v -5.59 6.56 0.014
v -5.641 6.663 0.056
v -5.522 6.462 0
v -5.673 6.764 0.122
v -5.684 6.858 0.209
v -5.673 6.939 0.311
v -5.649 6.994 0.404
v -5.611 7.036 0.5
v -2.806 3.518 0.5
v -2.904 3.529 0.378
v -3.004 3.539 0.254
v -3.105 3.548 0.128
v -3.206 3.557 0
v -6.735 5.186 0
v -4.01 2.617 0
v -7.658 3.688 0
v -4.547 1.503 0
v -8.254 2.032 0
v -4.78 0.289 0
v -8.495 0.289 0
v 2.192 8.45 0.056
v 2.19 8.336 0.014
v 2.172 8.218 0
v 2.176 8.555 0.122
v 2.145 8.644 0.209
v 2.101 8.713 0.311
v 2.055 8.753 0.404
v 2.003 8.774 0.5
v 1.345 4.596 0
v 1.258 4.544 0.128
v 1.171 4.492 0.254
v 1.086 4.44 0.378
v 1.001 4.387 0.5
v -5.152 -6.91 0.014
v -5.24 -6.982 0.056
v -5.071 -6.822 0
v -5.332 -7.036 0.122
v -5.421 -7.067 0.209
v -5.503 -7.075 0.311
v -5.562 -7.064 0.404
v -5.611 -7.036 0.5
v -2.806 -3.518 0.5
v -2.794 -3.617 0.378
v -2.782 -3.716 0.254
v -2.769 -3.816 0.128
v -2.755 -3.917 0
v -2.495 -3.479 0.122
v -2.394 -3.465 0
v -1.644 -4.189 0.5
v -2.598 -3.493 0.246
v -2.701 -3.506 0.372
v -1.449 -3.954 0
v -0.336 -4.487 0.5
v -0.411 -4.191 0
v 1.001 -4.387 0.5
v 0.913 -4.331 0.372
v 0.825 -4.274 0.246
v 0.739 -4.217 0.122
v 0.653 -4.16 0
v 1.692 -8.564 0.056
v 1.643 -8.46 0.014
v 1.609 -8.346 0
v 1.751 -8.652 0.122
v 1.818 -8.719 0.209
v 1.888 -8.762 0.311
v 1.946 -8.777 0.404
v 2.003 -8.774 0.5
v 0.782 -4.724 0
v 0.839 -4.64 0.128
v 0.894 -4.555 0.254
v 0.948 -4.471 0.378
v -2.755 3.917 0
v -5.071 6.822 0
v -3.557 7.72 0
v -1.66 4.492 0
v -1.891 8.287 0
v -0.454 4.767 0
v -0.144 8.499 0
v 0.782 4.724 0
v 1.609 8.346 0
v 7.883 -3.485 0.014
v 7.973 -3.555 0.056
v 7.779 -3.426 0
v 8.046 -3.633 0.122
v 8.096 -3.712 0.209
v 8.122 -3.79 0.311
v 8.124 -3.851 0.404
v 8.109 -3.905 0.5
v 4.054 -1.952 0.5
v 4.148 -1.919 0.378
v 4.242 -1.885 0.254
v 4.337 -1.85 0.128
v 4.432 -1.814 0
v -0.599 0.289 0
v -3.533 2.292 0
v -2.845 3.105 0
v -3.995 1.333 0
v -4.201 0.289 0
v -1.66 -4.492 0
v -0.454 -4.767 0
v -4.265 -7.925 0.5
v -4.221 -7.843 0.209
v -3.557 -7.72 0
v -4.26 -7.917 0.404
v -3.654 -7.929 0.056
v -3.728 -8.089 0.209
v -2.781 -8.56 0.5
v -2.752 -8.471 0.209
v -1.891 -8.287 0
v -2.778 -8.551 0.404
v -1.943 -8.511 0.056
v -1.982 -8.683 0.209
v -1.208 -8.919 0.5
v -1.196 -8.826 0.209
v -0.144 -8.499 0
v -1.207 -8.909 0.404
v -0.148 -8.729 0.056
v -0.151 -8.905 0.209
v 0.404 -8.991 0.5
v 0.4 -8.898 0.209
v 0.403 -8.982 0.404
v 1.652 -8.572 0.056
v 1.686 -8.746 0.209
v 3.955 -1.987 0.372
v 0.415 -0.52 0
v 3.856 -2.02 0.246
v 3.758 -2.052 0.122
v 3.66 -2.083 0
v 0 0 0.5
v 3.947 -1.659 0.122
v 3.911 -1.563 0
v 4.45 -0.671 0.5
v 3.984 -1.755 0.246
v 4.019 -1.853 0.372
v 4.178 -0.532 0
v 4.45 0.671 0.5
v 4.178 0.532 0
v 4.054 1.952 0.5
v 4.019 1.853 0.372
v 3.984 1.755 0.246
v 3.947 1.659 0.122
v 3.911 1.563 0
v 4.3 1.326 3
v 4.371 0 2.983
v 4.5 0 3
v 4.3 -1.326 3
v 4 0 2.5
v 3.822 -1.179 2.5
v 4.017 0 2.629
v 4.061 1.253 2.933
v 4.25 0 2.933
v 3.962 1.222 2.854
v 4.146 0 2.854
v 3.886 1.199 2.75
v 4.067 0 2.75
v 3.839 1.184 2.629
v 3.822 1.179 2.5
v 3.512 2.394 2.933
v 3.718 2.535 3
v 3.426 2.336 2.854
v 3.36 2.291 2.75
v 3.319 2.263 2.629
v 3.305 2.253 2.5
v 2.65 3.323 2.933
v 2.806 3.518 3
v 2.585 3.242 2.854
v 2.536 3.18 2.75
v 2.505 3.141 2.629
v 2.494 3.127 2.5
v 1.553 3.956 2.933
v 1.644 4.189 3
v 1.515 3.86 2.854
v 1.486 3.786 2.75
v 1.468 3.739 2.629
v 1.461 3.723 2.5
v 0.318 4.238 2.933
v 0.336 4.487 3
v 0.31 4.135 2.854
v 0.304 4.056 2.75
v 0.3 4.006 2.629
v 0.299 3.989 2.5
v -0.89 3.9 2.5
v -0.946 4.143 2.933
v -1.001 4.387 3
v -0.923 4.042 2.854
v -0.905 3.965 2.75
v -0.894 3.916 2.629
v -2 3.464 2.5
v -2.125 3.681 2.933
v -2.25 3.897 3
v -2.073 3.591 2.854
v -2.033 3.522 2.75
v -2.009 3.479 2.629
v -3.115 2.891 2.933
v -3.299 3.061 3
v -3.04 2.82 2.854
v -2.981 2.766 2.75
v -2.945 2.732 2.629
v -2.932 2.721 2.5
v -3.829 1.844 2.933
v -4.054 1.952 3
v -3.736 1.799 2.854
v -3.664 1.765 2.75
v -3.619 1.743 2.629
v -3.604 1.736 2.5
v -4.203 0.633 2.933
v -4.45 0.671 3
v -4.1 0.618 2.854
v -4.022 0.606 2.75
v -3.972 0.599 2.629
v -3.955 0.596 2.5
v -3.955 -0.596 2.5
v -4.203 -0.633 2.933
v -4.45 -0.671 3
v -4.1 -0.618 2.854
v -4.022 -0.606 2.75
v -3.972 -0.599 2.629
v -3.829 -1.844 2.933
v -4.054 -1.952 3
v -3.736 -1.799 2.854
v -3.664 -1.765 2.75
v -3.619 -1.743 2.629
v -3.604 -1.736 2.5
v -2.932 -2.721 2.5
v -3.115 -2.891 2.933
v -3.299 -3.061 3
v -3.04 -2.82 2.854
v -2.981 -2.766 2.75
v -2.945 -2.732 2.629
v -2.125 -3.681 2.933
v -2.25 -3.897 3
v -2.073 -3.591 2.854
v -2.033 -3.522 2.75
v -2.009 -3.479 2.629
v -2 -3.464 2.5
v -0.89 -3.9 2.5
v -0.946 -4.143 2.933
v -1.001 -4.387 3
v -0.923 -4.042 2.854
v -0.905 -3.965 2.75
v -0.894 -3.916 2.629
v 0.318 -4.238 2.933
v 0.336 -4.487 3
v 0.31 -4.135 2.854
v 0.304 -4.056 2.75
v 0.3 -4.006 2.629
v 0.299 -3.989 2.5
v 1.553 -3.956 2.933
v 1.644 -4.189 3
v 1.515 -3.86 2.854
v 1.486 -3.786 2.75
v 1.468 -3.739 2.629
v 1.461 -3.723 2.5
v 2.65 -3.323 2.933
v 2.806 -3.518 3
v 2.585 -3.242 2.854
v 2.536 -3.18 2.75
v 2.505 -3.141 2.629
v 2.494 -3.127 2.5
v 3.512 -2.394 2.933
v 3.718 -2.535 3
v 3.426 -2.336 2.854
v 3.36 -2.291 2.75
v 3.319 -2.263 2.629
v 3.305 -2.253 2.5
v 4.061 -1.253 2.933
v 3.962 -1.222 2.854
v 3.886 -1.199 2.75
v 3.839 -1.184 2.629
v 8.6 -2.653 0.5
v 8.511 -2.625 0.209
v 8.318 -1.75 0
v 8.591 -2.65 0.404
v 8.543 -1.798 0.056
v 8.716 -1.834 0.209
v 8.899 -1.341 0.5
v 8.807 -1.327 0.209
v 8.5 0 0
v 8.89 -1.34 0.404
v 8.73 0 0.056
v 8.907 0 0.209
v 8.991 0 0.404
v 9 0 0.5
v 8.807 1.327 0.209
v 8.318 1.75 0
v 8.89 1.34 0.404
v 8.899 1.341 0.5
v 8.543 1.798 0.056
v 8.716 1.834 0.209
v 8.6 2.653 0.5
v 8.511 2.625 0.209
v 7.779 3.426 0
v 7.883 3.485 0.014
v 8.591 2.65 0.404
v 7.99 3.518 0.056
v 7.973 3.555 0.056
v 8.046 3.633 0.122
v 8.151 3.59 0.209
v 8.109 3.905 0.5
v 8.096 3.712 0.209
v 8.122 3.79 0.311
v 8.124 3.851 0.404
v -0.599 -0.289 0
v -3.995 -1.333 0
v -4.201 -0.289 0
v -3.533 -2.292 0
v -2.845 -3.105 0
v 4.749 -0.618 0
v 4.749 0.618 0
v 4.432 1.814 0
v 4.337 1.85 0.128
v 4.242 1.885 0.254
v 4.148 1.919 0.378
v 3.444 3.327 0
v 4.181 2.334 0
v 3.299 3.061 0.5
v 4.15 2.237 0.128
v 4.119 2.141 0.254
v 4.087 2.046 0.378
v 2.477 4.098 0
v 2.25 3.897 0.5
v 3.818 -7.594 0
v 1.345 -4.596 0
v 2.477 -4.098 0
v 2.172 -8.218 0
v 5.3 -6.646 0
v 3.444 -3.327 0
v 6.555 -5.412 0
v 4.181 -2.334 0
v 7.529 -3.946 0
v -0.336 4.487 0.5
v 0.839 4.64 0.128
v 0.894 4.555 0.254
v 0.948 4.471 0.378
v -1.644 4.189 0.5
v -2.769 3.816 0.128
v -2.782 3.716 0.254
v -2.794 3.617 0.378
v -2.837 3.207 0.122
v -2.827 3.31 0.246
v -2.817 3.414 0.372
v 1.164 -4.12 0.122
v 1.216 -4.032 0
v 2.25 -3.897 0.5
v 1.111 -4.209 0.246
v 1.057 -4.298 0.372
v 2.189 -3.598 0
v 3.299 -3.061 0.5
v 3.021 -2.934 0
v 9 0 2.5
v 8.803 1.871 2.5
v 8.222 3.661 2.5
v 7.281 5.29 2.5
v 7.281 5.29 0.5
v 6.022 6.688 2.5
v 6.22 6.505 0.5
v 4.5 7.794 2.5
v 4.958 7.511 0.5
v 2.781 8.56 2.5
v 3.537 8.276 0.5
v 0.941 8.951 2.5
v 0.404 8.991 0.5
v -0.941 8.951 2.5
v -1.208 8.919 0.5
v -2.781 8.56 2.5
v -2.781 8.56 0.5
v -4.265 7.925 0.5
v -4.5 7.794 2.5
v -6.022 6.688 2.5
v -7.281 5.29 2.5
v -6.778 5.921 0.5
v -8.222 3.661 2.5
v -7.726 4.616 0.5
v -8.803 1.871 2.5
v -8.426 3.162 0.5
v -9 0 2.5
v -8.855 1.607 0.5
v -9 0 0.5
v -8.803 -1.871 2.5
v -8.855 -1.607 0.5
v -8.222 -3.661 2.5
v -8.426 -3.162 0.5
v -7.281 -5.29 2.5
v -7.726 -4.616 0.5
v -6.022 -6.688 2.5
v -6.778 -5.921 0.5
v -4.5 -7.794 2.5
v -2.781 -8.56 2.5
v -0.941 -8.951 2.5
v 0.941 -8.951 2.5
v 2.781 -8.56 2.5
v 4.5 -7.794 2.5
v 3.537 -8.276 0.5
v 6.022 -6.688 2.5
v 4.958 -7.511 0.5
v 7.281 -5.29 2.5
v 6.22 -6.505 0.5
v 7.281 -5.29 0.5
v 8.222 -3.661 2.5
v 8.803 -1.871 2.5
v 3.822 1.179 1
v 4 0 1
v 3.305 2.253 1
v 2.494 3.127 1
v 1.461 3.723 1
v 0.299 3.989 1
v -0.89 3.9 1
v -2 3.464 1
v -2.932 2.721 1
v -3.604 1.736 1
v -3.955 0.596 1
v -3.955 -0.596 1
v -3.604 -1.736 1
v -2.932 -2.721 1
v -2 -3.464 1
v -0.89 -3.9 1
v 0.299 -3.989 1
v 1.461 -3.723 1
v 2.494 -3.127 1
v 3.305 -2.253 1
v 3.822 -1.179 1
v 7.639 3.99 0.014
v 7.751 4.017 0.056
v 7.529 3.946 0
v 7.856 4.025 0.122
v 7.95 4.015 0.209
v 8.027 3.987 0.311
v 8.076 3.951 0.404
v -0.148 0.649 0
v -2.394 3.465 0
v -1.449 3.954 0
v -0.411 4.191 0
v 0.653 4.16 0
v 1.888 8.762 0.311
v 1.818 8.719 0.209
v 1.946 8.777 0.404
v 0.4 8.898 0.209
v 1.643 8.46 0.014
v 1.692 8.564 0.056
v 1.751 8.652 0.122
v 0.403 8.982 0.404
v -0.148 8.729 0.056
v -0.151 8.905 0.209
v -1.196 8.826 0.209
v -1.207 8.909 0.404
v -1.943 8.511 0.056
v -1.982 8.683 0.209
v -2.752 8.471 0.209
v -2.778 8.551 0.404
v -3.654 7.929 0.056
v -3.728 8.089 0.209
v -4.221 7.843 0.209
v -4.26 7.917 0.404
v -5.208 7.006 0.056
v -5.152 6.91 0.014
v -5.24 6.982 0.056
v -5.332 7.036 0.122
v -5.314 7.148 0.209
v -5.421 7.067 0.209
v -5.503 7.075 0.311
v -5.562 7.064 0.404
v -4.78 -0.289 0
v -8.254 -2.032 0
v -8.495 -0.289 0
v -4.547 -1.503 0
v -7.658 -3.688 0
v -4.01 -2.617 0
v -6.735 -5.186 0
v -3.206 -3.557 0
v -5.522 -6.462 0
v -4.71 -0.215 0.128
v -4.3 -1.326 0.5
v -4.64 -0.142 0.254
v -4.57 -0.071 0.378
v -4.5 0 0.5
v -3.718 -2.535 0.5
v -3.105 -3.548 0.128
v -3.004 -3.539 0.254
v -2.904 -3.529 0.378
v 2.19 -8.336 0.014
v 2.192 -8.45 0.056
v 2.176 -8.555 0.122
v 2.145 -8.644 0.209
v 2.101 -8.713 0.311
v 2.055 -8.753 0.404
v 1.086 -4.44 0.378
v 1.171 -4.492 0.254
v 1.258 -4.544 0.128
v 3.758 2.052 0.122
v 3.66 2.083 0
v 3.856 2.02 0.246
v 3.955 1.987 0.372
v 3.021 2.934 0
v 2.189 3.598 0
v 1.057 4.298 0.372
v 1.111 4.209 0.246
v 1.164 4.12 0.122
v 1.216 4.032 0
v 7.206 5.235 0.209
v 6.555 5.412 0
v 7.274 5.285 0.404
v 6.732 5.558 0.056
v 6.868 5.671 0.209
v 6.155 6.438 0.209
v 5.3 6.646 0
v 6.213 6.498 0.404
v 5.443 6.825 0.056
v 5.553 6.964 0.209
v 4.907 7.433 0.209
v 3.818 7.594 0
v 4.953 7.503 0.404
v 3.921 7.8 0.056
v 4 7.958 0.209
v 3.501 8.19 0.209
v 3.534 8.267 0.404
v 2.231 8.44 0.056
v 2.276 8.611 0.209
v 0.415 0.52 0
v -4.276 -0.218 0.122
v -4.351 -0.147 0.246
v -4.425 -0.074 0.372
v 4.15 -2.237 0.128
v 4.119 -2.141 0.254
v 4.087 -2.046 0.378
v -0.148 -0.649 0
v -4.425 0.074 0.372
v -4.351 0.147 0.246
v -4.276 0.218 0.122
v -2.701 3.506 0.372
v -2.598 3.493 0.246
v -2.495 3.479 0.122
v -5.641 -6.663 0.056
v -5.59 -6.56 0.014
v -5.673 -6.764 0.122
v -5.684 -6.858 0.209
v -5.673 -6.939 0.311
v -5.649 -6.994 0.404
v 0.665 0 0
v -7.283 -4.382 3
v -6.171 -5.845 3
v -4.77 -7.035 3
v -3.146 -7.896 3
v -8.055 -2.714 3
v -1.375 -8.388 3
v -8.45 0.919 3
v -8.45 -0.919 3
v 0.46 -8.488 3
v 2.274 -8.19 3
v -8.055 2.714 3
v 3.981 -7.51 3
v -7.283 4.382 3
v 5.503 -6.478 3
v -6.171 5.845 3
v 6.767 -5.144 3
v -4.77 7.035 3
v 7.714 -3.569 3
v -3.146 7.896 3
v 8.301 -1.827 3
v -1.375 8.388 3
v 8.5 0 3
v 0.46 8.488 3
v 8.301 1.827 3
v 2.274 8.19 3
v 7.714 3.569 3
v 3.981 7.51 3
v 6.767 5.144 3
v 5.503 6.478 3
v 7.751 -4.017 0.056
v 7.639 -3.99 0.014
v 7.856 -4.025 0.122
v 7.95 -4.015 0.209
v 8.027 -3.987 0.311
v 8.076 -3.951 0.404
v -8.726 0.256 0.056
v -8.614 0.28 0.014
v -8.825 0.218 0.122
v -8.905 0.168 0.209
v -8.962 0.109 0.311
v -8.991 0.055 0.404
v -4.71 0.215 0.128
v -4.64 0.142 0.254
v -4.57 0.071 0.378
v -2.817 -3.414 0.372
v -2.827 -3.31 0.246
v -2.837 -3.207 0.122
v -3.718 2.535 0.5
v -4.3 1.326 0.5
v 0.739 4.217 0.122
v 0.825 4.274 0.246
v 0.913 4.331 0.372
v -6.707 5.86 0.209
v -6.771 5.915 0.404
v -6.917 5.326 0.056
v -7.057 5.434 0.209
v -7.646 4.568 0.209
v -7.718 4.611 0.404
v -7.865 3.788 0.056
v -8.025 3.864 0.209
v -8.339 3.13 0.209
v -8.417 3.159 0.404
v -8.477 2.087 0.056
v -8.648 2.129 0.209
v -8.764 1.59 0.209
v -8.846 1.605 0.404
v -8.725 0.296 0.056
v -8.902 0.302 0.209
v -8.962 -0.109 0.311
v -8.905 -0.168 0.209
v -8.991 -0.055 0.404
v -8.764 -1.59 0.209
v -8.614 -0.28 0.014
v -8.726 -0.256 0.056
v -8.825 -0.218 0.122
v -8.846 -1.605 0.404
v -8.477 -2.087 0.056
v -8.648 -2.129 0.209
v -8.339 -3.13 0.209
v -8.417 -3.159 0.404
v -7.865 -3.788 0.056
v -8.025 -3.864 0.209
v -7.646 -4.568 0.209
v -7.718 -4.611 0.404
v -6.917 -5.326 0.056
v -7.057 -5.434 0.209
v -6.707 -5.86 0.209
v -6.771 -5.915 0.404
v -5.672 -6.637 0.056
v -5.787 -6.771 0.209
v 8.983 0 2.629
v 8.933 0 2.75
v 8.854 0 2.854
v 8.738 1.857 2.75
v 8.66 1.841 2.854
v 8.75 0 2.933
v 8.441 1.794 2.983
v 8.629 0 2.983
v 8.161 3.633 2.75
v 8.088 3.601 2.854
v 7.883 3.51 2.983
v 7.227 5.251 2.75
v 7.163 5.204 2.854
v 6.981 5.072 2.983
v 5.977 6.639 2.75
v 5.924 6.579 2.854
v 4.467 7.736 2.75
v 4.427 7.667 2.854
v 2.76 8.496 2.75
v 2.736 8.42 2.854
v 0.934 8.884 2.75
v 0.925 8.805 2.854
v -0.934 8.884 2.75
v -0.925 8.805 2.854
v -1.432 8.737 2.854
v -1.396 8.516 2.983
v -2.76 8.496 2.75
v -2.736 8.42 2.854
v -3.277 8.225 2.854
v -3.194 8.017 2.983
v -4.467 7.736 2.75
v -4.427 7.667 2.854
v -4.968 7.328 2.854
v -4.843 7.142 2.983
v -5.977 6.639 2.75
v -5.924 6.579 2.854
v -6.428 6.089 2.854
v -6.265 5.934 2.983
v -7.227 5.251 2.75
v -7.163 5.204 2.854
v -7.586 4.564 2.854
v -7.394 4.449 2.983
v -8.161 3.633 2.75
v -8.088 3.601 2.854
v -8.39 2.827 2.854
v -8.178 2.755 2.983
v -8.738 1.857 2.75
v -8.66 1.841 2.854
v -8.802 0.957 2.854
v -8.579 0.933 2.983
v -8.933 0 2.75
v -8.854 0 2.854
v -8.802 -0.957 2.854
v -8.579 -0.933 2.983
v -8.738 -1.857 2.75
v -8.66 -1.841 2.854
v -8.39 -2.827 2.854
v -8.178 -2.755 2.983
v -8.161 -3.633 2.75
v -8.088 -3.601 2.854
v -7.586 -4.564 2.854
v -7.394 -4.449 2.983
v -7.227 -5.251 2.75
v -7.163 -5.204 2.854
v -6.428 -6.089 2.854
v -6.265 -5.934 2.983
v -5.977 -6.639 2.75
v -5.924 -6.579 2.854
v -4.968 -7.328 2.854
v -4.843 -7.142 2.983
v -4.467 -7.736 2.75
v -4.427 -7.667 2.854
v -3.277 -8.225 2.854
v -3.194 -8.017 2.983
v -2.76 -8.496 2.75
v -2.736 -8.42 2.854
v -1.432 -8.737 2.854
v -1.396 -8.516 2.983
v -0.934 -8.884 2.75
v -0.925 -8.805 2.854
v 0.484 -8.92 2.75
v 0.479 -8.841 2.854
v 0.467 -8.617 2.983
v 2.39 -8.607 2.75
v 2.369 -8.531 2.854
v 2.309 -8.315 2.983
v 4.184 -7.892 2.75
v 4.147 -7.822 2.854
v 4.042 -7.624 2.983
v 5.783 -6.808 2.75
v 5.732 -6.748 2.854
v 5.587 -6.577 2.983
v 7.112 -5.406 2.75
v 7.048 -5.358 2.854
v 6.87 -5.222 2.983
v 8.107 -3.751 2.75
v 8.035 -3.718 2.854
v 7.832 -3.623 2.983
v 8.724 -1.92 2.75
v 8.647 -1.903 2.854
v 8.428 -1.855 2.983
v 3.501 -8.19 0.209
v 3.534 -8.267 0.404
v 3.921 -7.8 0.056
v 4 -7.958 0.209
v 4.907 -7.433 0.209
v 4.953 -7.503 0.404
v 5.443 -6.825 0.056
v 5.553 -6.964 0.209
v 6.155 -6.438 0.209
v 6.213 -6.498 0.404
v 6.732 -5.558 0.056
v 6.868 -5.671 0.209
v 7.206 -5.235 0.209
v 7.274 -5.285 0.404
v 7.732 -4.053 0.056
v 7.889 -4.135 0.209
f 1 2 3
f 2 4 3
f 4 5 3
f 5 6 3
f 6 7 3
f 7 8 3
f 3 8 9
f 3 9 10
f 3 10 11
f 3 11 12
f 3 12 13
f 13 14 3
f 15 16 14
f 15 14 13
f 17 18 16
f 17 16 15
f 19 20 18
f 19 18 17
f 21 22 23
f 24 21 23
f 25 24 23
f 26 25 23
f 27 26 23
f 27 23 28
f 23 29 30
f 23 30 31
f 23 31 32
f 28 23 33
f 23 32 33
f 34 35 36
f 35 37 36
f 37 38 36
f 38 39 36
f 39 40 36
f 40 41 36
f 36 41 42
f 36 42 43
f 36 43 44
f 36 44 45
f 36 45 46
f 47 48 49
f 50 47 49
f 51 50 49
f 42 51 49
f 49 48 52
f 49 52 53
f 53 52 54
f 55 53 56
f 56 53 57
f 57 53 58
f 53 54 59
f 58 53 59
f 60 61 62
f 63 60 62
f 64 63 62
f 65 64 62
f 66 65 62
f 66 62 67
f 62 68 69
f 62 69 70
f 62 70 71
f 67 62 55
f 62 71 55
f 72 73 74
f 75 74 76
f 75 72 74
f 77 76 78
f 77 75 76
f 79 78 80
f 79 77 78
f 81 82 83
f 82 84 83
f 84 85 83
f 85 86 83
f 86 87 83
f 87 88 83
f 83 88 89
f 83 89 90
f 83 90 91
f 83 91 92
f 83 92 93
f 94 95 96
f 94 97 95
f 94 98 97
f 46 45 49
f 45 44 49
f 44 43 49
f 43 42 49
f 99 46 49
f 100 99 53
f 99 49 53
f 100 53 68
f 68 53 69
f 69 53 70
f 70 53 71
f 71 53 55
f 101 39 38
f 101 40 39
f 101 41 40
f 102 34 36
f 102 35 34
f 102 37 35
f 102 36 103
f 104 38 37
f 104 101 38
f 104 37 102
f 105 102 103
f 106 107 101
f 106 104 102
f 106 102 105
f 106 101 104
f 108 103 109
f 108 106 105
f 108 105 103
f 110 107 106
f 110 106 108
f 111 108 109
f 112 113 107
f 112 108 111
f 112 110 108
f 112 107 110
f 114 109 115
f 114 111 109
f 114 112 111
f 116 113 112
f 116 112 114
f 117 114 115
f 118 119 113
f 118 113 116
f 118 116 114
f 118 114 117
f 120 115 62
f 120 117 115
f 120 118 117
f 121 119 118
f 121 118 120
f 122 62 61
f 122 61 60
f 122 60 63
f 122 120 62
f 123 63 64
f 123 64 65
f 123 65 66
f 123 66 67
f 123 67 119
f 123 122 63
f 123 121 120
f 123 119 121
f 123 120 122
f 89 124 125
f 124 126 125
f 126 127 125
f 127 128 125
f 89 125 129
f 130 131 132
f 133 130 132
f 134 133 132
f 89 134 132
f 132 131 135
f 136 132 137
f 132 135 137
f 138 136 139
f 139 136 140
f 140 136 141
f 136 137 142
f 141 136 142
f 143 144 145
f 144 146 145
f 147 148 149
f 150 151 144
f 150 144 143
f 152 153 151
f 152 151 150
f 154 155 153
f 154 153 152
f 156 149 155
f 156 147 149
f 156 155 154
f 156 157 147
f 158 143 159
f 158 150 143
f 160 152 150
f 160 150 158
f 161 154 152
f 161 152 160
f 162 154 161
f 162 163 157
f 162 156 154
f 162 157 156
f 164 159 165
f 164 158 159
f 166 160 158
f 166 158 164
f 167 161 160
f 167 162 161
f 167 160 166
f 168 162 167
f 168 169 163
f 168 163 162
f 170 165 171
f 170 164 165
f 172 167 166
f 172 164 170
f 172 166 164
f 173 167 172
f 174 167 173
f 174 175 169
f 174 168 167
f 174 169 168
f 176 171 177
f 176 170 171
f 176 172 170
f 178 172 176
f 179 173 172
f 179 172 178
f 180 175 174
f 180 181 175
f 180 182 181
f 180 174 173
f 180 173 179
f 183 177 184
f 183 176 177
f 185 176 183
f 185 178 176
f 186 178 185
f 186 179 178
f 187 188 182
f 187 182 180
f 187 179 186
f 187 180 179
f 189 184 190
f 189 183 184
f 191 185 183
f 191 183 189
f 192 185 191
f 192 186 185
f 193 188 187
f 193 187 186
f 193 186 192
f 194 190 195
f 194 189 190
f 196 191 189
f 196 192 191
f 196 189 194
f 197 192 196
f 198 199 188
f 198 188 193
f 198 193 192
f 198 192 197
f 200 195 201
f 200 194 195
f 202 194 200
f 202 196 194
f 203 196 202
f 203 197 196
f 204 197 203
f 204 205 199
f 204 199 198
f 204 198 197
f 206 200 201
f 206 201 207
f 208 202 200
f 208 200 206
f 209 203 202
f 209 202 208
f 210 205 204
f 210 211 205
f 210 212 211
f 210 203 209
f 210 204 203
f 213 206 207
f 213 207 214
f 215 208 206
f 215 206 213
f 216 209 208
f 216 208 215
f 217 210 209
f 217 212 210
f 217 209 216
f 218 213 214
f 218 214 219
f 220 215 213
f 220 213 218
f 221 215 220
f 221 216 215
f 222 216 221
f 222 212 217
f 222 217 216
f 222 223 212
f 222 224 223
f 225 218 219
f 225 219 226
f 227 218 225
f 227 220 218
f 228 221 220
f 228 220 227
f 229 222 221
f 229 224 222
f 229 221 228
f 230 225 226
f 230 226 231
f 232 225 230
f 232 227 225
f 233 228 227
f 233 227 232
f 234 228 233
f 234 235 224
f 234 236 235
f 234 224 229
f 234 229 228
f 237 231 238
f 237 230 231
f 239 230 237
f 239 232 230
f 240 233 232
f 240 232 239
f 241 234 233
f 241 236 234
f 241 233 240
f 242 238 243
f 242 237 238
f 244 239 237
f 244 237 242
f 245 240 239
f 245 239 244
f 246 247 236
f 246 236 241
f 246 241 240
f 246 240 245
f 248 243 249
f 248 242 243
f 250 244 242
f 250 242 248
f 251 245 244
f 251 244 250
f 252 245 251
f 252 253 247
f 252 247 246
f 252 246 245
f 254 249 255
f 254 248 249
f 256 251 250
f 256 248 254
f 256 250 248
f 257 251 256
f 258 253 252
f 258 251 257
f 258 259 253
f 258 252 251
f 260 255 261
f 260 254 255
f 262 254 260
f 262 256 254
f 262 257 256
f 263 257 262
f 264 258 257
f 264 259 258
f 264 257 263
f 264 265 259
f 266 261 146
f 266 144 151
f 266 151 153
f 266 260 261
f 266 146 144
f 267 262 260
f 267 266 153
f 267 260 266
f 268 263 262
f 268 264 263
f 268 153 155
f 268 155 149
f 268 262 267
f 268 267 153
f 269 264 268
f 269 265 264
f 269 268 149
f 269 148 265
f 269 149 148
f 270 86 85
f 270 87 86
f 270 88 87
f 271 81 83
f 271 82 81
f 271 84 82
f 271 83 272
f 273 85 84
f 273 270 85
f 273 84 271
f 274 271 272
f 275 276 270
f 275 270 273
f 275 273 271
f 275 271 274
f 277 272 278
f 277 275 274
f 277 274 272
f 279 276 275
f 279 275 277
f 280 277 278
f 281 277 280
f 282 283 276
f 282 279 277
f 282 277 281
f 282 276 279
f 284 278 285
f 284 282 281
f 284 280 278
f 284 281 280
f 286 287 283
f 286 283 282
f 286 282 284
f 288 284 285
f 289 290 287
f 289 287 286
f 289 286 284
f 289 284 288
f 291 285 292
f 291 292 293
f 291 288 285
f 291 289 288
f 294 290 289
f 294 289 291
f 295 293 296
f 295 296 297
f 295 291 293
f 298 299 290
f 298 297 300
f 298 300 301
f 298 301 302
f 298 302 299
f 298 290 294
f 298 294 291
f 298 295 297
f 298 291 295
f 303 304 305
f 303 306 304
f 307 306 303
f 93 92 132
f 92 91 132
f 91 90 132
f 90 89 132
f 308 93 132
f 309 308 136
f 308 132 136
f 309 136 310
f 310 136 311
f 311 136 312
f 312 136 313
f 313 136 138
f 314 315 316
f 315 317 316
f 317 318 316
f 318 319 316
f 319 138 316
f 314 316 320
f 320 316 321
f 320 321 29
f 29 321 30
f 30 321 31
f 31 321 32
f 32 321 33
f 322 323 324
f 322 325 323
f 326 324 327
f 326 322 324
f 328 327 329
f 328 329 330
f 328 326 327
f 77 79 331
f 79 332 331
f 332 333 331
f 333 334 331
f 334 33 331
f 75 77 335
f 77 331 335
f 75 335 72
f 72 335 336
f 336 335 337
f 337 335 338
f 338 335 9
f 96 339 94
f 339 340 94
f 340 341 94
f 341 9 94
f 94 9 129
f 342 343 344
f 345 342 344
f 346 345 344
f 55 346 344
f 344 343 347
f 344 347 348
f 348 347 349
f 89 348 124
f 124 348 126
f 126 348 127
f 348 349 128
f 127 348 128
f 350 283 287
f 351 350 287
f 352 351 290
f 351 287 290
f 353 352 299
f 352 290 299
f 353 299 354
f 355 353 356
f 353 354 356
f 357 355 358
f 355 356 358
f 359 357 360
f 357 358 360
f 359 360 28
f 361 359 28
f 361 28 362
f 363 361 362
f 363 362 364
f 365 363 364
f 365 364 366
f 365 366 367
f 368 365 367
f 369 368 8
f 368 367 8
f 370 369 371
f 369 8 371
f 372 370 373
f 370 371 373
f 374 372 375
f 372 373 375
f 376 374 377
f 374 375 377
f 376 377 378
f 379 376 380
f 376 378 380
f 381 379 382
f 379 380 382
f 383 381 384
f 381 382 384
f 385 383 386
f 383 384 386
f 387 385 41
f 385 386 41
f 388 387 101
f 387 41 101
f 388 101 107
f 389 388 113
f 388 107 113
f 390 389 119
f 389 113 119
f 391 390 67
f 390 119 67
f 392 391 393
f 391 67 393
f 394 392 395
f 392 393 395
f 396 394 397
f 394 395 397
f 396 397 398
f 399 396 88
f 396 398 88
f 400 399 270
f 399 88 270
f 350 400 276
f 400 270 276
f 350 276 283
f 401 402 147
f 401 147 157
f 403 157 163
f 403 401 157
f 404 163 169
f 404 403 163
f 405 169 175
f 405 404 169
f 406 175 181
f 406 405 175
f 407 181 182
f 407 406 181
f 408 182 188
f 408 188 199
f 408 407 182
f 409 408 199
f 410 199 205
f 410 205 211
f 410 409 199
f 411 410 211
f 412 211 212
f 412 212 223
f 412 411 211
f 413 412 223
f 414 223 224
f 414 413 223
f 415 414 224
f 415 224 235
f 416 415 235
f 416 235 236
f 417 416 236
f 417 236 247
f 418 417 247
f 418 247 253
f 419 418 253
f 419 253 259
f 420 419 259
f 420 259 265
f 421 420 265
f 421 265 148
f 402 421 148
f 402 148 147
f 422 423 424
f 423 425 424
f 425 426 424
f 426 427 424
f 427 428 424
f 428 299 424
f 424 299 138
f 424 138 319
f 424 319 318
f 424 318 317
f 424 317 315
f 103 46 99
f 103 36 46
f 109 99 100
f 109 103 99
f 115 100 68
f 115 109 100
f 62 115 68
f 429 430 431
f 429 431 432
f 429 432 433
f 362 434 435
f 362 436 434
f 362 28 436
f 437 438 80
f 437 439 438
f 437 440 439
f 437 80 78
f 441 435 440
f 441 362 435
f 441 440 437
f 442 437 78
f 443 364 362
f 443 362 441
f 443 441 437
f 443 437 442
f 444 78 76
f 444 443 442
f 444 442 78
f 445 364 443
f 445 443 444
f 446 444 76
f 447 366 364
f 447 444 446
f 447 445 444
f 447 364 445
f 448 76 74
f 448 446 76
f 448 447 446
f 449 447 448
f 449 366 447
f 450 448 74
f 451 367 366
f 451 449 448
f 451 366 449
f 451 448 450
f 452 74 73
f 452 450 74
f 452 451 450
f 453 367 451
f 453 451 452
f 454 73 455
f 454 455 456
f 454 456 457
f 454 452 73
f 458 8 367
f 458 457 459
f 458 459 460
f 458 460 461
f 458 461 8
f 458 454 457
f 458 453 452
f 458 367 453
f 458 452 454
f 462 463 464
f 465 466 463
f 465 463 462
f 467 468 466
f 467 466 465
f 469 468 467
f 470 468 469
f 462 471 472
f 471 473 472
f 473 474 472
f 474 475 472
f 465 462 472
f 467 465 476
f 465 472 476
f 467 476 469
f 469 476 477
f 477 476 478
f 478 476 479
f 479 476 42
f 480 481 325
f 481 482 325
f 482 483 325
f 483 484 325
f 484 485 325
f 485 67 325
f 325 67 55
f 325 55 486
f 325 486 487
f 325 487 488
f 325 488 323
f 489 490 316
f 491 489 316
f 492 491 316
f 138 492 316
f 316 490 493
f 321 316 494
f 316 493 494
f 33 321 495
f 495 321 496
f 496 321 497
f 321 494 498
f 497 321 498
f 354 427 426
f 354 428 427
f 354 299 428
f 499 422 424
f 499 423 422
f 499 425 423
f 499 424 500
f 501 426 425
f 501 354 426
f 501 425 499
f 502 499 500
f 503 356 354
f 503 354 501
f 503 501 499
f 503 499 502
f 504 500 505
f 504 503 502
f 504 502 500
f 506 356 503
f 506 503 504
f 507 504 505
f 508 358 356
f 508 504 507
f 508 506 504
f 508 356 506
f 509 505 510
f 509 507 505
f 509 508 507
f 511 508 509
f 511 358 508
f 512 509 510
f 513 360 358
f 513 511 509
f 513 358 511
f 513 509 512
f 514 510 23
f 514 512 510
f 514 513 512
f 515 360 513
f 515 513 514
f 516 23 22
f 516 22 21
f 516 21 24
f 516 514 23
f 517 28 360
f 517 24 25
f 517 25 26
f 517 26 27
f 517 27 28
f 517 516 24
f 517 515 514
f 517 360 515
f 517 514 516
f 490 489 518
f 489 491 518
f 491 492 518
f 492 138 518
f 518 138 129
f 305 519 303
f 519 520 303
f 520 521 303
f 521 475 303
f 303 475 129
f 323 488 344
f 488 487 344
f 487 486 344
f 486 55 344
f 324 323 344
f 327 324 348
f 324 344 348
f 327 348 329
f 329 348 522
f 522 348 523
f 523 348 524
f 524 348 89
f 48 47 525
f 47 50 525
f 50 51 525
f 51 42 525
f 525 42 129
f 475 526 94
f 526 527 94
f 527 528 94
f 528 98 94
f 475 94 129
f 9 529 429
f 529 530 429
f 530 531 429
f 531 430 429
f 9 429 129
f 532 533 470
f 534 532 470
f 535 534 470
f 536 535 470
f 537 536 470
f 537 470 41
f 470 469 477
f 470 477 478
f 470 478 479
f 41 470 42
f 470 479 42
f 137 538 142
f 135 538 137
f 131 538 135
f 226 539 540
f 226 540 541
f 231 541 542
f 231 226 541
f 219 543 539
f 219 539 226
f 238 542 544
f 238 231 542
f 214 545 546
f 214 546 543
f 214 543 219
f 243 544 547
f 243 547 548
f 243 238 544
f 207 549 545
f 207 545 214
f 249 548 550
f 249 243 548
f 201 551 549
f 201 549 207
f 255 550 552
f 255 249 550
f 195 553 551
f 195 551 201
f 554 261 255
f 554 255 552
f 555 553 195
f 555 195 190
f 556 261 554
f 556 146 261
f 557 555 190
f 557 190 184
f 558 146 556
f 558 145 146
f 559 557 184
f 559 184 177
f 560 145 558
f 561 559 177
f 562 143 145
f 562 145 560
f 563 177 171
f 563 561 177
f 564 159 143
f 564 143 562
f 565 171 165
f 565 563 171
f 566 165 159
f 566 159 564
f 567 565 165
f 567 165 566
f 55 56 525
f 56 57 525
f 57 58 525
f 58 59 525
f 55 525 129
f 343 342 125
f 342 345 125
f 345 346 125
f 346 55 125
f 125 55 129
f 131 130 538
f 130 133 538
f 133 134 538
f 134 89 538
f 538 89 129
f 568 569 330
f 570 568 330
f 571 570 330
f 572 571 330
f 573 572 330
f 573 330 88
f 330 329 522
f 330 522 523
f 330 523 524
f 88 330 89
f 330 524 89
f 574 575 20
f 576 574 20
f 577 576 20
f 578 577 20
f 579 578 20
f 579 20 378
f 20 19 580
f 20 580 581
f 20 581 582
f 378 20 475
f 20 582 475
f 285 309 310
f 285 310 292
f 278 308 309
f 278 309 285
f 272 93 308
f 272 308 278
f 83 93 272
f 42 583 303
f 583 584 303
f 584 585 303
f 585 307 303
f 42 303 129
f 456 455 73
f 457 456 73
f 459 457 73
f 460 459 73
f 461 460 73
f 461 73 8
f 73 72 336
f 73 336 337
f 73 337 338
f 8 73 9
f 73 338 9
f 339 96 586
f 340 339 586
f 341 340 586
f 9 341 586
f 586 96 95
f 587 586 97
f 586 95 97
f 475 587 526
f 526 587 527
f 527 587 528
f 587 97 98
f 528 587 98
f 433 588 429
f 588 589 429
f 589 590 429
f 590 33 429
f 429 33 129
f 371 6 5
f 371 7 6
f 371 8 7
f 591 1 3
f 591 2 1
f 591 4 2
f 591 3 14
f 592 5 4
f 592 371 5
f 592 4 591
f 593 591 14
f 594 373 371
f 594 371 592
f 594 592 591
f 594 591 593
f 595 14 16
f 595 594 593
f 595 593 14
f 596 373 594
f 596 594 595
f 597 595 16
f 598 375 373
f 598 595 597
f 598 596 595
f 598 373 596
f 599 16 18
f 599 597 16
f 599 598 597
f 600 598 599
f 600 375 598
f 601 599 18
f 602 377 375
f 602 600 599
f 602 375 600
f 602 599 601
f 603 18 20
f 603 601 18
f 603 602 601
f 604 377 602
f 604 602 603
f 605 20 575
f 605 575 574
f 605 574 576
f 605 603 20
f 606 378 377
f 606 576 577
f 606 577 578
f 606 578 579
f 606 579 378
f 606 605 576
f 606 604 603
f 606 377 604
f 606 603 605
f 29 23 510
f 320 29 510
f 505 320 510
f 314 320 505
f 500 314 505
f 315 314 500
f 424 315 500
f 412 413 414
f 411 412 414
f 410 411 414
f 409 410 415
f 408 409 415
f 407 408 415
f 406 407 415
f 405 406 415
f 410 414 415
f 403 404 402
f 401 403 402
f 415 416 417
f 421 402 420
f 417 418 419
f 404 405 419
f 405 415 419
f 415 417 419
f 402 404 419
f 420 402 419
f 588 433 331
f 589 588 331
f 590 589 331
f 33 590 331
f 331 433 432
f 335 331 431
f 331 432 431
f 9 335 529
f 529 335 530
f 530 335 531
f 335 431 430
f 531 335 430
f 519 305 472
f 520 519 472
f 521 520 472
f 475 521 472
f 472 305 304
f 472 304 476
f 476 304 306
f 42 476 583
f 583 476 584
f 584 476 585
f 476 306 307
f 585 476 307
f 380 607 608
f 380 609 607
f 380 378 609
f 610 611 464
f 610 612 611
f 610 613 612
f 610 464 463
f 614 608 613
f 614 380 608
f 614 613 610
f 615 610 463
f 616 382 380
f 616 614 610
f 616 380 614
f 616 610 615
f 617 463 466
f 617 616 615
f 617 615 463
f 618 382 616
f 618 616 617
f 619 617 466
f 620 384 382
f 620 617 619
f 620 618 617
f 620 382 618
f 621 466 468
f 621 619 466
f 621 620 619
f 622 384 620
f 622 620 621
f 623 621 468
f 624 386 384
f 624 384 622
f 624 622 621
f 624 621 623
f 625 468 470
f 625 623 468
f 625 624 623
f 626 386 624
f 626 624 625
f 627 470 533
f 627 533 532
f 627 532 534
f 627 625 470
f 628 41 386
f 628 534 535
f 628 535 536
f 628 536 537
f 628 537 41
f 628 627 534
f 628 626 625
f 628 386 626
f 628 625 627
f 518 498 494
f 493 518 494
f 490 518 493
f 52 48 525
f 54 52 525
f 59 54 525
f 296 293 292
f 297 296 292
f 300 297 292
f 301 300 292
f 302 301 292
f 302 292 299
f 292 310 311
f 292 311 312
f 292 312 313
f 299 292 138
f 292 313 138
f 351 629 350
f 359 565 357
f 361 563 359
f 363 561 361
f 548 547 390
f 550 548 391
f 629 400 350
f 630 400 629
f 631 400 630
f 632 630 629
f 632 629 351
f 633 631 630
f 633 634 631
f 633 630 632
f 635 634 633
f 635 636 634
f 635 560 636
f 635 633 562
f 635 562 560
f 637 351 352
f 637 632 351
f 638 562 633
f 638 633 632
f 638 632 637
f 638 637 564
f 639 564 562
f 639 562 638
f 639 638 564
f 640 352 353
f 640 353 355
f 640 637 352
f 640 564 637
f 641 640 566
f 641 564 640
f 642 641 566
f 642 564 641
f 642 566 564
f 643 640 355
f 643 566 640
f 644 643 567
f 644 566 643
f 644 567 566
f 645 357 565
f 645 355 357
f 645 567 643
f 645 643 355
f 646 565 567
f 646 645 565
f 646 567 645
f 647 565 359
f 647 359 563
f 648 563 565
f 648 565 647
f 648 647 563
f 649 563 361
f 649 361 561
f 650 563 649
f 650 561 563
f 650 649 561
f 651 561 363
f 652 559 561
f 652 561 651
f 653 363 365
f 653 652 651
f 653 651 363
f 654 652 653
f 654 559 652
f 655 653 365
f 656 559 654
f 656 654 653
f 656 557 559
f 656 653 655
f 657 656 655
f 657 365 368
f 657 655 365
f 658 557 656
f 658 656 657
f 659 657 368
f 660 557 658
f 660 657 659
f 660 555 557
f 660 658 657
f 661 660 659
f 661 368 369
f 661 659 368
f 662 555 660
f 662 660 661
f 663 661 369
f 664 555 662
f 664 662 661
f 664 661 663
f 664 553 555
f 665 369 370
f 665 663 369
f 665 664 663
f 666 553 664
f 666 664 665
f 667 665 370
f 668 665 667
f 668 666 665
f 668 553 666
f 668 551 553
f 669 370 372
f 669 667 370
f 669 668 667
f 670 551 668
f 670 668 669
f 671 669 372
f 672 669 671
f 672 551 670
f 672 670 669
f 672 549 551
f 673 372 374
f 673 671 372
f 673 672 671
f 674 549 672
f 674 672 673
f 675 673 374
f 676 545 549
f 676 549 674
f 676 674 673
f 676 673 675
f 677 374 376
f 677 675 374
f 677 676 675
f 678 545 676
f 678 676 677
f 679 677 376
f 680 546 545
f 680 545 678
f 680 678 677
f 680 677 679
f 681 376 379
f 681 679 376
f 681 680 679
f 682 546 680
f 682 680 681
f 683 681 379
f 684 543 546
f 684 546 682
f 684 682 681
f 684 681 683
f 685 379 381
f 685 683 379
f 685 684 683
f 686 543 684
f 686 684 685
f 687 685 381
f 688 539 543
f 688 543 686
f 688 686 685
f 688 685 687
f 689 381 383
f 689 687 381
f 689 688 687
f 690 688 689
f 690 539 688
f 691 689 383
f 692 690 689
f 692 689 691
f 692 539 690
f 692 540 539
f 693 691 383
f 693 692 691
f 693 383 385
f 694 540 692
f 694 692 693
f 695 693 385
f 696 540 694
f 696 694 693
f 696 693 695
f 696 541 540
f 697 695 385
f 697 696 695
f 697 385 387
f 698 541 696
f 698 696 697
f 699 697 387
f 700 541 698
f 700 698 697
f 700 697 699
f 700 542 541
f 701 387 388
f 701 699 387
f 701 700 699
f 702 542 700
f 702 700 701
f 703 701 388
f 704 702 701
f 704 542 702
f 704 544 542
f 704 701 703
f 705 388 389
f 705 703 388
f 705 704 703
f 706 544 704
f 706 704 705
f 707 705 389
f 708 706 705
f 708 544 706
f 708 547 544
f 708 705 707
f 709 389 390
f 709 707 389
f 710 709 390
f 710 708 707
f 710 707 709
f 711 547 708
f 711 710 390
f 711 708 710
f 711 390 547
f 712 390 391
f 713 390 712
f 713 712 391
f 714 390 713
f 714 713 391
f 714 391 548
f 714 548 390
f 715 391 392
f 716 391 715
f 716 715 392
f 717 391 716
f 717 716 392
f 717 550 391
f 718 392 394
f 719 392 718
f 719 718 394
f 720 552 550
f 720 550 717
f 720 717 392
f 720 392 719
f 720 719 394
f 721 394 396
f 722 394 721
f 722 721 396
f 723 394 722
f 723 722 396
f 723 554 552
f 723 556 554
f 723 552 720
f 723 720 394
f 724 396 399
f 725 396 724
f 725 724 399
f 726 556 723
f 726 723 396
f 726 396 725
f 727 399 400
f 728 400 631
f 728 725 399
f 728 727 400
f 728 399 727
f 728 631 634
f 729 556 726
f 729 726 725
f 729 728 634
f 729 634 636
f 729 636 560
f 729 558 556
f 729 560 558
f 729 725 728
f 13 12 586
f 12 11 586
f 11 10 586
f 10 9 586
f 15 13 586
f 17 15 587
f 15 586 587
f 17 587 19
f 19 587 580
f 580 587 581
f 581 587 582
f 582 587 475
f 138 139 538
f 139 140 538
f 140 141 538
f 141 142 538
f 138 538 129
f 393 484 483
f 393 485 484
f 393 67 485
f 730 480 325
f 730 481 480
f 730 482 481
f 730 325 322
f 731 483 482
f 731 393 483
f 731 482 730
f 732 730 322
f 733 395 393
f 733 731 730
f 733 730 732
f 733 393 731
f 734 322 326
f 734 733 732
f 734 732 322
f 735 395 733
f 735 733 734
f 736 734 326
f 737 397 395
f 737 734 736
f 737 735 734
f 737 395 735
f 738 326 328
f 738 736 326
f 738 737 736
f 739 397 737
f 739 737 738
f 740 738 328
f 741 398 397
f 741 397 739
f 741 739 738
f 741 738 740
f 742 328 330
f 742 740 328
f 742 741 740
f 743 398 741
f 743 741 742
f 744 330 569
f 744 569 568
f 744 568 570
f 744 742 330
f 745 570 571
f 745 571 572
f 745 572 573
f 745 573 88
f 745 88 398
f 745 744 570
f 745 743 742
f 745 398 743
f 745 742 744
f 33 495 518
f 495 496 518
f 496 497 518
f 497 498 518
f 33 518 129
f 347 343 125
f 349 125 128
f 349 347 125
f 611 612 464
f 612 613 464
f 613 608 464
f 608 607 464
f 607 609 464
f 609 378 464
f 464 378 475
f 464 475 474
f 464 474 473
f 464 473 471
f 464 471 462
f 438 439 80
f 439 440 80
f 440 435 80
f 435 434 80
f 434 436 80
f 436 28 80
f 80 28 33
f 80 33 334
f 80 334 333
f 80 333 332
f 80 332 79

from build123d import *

# Parameters (mm, degrees)
F0_R            = 9
F0_R_2          = 4
F1_DEPTH        = 3
F2_R            = 4
F3_DEPTH        = 1
F4_R            = 0.5
F6_DEPTH        = 9.001
F6_COPIES_COUNT = 7
F10_R           = 0.5


# Not quite as in the source:
# - a pattern or mirror of a feature is missing from the dataset's text; its kind, count and spacing are read off the source's solid


with BuildPart() as f1:
    # F0 (on Top) → F1 (new body)
    with BuildSketch(Plane.XY):
        Circle(F0_R)
        Circle(F0_R_2, mode=Mode.SUBTRACT)
    extrude(amount=F1_DEPTH)

    # F2 (on face) → F3 (join)
    with BuildSketch(Plane(origin=(0, 0, 0), x_dir=(1, 0, 0), z_dir=(0, 0, -1))):
        Circle(F2_R)
    extrude(amount=-F3_DEPTH)

    # F4
    f4_edges = [f1.edges().sort_by_distance(p)[0] for p in [
        (-9, 0, 0),
        (-9, 0, 3),
    ]]
    fillet(f4_edges, radius=F4_R)

    # F5 (on Right) → F6 (cut, through all)
    with BuildSketch(Plane.YZ):
        Polygon((-0.2886751346, 0), (0.2886751346, 0), (0, 0.5), align=None)
    f6 = extrude(amount=-F6_DEPTH, mode=Mode.SUBTRACT)

    # F6_copies: F6 ×7 about axis
    f6_copies_axis = Axis((0, 0, 0), (0, 0, 1))
    for i in range(1, F6_COPIES_COUNT):
        add(f6.rotate(f6_copies_axis, i * 360 / F6_COPIES_COUNT), mode=Mode.SUBTRACT)

    # F7 (on Right) → F9 (revolve, cut)
    with BuildSketch(Plane.YZ):
        Polygon((4.5, 0.5), (4.2113248654, 0), (4.7886751346, 0), align=None)
    revolve(axis=Axis((0, 0, 0.5049179308), (0, 0, 1)), mode=Mode.SUBTRACT)

    # F10
    f10_edges = [f1.edges().sort_by_distance(p)[0] for p in [
        (-4, 0, 3),
    ]]
    fillet(f10_edges, radius=F10_R)


solid = f1.part
